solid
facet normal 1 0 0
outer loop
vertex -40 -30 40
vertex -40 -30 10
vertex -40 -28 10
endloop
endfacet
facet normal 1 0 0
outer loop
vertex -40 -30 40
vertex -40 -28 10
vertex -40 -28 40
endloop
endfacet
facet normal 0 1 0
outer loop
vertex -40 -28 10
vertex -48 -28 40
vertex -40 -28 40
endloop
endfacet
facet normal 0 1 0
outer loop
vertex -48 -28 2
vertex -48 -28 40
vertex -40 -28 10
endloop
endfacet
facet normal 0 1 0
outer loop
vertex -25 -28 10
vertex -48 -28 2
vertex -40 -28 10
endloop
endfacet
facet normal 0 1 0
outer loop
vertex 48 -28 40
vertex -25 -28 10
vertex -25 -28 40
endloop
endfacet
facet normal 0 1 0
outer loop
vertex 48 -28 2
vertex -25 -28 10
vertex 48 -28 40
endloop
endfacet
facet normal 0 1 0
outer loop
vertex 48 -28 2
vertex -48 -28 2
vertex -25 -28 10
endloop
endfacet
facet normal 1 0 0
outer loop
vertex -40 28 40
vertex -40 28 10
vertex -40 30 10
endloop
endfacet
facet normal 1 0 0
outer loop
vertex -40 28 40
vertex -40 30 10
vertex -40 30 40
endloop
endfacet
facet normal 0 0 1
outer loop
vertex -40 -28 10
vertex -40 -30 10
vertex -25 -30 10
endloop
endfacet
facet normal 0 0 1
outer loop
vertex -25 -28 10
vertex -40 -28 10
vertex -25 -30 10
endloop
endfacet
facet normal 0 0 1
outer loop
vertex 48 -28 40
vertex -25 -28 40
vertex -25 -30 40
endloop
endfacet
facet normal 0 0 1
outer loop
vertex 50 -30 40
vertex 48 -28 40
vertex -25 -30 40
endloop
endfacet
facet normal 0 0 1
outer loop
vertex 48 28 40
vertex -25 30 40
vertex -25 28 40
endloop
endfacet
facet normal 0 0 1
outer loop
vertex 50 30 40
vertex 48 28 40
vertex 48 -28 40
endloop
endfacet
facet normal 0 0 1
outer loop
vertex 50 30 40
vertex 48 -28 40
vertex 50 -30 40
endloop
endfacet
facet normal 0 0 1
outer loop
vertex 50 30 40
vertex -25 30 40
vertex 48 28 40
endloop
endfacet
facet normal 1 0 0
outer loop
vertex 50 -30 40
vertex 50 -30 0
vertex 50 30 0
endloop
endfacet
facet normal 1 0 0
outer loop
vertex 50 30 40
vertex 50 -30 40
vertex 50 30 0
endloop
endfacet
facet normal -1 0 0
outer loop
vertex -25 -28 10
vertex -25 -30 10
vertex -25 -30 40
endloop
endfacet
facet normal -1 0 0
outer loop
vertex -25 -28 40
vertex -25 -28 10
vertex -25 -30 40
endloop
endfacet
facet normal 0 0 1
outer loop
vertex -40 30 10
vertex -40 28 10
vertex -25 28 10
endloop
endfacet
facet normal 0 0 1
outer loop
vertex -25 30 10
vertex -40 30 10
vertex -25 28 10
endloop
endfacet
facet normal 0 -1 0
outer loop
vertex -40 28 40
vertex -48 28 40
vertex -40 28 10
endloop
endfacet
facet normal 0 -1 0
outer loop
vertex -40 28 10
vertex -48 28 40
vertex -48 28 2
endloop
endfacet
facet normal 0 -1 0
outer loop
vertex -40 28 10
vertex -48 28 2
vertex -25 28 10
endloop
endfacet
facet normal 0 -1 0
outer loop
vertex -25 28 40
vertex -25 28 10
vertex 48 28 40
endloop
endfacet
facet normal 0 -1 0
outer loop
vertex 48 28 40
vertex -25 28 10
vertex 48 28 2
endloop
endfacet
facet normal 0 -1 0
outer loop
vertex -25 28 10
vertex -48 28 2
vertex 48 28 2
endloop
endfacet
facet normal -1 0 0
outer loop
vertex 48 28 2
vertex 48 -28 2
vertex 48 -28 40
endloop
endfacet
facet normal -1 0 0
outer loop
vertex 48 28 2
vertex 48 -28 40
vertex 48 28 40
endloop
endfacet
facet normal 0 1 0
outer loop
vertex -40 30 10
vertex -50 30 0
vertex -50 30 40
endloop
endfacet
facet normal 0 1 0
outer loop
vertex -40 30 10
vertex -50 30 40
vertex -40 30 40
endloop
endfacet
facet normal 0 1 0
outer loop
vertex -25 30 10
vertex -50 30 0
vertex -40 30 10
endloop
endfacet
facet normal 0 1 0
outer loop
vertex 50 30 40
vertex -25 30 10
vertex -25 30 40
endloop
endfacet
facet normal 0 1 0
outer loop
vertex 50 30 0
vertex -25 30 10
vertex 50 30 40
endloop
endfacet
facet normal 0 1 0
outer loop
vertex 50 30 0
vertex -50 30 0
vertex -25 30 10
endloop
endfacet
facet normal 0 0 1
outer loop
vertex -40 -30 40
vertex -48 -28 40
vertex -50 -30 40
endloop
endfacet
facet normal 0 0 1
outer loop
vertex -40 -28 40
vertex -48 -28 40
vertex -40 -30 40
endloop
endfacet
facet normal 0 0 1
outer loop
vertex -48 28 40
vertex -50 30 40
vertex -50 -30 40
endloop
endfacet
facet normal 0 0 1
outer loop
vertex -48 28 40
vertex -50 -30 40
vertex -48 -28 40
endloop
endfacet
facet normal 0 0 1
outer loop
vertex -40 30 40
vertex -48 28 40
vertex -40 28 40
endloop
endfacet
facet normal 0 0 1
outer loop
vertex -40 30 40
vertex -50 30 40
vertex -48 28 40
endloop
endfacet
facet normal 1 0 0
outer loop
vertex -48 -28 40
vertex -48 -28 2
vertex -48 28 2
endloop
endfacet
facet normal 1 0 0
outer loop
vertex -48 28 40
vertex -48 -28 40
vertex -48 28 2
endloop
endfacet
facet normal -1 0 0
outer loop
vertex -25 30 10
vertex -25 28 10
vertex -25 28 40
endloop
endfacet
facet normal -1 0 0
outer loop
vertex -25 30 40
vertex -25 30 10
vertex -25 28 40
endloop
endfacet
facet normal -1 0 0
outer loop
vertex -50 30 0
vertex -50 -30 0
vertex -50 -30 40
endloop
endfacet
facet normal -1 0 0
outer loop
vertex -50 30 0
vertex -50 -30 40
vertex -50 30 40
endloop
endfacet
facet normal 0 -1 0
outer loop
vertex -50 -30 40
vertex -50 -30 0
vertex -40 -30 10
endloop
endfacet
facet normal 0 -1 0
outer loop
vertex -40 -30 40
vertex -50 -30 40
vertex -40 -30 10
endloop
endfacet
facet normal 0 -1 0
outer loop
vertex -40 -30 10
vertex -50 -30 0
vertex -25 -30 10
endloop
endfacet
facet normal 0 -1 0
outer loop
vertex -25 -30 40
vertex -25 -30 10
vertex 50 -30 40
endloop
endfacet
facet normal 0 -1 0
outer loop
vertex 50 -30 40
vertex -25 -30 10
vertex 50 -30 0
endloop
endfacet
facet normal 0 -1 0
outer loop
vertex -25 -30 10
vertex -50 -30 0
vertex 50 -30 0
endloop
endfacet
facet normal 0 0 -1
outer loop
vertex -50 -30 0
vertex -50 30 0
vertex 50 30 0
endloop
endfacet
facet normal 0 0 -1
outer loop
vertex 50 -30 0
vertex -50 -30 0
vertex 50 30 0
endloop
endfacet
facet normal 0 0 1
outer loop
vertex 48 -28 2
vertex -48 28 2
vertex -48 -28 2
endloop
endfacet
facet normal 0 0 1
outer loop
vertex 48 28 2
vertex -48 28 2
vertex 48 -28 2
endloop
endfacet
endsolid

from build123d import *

# Parameters (mm, degrees)
SKETCH_1_W          = 100
SKETCH_1_H          = 60
EXTRUDE_1_DEPTH     = 40
SHELL_1_T           = -2
SKETCH_2_W          = 15
SKETCH_2_H          = 30
CUT_EXTRUDE_1_DEPTH = 60


with BuildPart() as part:
    # 草圖1 → 填料-伸長1 (new body)
    with BuildSketch(Plane.XY):
        Rectangle(SKETCH_1_W, SKETCH_1_H)
    extrude(amount=EXTRUDE_1_DEPTH)

    # 薄殼1
    shell_1_openings = [part.faces().sort_by_distance(p)[0] for p in [
        (0, 0, 40),
    ]]
    offset(amount=SHELL_1_T, openings=shell_1_openings, kind=Kind.INTERSECTION)

    # 草圖2 → 除料-伸長1 (cut)
    with BuildSketch(Plane.XZ.offset(30)):
        with Locations((-32.5, 25)):
            Rectangle(SKETCH_2_W, SKETCH_2_H)
    extrude(amount=-CUT_EXTRUDE_1_DEPTH, mode=Mode.SUBTRACT)


solid = part.part
